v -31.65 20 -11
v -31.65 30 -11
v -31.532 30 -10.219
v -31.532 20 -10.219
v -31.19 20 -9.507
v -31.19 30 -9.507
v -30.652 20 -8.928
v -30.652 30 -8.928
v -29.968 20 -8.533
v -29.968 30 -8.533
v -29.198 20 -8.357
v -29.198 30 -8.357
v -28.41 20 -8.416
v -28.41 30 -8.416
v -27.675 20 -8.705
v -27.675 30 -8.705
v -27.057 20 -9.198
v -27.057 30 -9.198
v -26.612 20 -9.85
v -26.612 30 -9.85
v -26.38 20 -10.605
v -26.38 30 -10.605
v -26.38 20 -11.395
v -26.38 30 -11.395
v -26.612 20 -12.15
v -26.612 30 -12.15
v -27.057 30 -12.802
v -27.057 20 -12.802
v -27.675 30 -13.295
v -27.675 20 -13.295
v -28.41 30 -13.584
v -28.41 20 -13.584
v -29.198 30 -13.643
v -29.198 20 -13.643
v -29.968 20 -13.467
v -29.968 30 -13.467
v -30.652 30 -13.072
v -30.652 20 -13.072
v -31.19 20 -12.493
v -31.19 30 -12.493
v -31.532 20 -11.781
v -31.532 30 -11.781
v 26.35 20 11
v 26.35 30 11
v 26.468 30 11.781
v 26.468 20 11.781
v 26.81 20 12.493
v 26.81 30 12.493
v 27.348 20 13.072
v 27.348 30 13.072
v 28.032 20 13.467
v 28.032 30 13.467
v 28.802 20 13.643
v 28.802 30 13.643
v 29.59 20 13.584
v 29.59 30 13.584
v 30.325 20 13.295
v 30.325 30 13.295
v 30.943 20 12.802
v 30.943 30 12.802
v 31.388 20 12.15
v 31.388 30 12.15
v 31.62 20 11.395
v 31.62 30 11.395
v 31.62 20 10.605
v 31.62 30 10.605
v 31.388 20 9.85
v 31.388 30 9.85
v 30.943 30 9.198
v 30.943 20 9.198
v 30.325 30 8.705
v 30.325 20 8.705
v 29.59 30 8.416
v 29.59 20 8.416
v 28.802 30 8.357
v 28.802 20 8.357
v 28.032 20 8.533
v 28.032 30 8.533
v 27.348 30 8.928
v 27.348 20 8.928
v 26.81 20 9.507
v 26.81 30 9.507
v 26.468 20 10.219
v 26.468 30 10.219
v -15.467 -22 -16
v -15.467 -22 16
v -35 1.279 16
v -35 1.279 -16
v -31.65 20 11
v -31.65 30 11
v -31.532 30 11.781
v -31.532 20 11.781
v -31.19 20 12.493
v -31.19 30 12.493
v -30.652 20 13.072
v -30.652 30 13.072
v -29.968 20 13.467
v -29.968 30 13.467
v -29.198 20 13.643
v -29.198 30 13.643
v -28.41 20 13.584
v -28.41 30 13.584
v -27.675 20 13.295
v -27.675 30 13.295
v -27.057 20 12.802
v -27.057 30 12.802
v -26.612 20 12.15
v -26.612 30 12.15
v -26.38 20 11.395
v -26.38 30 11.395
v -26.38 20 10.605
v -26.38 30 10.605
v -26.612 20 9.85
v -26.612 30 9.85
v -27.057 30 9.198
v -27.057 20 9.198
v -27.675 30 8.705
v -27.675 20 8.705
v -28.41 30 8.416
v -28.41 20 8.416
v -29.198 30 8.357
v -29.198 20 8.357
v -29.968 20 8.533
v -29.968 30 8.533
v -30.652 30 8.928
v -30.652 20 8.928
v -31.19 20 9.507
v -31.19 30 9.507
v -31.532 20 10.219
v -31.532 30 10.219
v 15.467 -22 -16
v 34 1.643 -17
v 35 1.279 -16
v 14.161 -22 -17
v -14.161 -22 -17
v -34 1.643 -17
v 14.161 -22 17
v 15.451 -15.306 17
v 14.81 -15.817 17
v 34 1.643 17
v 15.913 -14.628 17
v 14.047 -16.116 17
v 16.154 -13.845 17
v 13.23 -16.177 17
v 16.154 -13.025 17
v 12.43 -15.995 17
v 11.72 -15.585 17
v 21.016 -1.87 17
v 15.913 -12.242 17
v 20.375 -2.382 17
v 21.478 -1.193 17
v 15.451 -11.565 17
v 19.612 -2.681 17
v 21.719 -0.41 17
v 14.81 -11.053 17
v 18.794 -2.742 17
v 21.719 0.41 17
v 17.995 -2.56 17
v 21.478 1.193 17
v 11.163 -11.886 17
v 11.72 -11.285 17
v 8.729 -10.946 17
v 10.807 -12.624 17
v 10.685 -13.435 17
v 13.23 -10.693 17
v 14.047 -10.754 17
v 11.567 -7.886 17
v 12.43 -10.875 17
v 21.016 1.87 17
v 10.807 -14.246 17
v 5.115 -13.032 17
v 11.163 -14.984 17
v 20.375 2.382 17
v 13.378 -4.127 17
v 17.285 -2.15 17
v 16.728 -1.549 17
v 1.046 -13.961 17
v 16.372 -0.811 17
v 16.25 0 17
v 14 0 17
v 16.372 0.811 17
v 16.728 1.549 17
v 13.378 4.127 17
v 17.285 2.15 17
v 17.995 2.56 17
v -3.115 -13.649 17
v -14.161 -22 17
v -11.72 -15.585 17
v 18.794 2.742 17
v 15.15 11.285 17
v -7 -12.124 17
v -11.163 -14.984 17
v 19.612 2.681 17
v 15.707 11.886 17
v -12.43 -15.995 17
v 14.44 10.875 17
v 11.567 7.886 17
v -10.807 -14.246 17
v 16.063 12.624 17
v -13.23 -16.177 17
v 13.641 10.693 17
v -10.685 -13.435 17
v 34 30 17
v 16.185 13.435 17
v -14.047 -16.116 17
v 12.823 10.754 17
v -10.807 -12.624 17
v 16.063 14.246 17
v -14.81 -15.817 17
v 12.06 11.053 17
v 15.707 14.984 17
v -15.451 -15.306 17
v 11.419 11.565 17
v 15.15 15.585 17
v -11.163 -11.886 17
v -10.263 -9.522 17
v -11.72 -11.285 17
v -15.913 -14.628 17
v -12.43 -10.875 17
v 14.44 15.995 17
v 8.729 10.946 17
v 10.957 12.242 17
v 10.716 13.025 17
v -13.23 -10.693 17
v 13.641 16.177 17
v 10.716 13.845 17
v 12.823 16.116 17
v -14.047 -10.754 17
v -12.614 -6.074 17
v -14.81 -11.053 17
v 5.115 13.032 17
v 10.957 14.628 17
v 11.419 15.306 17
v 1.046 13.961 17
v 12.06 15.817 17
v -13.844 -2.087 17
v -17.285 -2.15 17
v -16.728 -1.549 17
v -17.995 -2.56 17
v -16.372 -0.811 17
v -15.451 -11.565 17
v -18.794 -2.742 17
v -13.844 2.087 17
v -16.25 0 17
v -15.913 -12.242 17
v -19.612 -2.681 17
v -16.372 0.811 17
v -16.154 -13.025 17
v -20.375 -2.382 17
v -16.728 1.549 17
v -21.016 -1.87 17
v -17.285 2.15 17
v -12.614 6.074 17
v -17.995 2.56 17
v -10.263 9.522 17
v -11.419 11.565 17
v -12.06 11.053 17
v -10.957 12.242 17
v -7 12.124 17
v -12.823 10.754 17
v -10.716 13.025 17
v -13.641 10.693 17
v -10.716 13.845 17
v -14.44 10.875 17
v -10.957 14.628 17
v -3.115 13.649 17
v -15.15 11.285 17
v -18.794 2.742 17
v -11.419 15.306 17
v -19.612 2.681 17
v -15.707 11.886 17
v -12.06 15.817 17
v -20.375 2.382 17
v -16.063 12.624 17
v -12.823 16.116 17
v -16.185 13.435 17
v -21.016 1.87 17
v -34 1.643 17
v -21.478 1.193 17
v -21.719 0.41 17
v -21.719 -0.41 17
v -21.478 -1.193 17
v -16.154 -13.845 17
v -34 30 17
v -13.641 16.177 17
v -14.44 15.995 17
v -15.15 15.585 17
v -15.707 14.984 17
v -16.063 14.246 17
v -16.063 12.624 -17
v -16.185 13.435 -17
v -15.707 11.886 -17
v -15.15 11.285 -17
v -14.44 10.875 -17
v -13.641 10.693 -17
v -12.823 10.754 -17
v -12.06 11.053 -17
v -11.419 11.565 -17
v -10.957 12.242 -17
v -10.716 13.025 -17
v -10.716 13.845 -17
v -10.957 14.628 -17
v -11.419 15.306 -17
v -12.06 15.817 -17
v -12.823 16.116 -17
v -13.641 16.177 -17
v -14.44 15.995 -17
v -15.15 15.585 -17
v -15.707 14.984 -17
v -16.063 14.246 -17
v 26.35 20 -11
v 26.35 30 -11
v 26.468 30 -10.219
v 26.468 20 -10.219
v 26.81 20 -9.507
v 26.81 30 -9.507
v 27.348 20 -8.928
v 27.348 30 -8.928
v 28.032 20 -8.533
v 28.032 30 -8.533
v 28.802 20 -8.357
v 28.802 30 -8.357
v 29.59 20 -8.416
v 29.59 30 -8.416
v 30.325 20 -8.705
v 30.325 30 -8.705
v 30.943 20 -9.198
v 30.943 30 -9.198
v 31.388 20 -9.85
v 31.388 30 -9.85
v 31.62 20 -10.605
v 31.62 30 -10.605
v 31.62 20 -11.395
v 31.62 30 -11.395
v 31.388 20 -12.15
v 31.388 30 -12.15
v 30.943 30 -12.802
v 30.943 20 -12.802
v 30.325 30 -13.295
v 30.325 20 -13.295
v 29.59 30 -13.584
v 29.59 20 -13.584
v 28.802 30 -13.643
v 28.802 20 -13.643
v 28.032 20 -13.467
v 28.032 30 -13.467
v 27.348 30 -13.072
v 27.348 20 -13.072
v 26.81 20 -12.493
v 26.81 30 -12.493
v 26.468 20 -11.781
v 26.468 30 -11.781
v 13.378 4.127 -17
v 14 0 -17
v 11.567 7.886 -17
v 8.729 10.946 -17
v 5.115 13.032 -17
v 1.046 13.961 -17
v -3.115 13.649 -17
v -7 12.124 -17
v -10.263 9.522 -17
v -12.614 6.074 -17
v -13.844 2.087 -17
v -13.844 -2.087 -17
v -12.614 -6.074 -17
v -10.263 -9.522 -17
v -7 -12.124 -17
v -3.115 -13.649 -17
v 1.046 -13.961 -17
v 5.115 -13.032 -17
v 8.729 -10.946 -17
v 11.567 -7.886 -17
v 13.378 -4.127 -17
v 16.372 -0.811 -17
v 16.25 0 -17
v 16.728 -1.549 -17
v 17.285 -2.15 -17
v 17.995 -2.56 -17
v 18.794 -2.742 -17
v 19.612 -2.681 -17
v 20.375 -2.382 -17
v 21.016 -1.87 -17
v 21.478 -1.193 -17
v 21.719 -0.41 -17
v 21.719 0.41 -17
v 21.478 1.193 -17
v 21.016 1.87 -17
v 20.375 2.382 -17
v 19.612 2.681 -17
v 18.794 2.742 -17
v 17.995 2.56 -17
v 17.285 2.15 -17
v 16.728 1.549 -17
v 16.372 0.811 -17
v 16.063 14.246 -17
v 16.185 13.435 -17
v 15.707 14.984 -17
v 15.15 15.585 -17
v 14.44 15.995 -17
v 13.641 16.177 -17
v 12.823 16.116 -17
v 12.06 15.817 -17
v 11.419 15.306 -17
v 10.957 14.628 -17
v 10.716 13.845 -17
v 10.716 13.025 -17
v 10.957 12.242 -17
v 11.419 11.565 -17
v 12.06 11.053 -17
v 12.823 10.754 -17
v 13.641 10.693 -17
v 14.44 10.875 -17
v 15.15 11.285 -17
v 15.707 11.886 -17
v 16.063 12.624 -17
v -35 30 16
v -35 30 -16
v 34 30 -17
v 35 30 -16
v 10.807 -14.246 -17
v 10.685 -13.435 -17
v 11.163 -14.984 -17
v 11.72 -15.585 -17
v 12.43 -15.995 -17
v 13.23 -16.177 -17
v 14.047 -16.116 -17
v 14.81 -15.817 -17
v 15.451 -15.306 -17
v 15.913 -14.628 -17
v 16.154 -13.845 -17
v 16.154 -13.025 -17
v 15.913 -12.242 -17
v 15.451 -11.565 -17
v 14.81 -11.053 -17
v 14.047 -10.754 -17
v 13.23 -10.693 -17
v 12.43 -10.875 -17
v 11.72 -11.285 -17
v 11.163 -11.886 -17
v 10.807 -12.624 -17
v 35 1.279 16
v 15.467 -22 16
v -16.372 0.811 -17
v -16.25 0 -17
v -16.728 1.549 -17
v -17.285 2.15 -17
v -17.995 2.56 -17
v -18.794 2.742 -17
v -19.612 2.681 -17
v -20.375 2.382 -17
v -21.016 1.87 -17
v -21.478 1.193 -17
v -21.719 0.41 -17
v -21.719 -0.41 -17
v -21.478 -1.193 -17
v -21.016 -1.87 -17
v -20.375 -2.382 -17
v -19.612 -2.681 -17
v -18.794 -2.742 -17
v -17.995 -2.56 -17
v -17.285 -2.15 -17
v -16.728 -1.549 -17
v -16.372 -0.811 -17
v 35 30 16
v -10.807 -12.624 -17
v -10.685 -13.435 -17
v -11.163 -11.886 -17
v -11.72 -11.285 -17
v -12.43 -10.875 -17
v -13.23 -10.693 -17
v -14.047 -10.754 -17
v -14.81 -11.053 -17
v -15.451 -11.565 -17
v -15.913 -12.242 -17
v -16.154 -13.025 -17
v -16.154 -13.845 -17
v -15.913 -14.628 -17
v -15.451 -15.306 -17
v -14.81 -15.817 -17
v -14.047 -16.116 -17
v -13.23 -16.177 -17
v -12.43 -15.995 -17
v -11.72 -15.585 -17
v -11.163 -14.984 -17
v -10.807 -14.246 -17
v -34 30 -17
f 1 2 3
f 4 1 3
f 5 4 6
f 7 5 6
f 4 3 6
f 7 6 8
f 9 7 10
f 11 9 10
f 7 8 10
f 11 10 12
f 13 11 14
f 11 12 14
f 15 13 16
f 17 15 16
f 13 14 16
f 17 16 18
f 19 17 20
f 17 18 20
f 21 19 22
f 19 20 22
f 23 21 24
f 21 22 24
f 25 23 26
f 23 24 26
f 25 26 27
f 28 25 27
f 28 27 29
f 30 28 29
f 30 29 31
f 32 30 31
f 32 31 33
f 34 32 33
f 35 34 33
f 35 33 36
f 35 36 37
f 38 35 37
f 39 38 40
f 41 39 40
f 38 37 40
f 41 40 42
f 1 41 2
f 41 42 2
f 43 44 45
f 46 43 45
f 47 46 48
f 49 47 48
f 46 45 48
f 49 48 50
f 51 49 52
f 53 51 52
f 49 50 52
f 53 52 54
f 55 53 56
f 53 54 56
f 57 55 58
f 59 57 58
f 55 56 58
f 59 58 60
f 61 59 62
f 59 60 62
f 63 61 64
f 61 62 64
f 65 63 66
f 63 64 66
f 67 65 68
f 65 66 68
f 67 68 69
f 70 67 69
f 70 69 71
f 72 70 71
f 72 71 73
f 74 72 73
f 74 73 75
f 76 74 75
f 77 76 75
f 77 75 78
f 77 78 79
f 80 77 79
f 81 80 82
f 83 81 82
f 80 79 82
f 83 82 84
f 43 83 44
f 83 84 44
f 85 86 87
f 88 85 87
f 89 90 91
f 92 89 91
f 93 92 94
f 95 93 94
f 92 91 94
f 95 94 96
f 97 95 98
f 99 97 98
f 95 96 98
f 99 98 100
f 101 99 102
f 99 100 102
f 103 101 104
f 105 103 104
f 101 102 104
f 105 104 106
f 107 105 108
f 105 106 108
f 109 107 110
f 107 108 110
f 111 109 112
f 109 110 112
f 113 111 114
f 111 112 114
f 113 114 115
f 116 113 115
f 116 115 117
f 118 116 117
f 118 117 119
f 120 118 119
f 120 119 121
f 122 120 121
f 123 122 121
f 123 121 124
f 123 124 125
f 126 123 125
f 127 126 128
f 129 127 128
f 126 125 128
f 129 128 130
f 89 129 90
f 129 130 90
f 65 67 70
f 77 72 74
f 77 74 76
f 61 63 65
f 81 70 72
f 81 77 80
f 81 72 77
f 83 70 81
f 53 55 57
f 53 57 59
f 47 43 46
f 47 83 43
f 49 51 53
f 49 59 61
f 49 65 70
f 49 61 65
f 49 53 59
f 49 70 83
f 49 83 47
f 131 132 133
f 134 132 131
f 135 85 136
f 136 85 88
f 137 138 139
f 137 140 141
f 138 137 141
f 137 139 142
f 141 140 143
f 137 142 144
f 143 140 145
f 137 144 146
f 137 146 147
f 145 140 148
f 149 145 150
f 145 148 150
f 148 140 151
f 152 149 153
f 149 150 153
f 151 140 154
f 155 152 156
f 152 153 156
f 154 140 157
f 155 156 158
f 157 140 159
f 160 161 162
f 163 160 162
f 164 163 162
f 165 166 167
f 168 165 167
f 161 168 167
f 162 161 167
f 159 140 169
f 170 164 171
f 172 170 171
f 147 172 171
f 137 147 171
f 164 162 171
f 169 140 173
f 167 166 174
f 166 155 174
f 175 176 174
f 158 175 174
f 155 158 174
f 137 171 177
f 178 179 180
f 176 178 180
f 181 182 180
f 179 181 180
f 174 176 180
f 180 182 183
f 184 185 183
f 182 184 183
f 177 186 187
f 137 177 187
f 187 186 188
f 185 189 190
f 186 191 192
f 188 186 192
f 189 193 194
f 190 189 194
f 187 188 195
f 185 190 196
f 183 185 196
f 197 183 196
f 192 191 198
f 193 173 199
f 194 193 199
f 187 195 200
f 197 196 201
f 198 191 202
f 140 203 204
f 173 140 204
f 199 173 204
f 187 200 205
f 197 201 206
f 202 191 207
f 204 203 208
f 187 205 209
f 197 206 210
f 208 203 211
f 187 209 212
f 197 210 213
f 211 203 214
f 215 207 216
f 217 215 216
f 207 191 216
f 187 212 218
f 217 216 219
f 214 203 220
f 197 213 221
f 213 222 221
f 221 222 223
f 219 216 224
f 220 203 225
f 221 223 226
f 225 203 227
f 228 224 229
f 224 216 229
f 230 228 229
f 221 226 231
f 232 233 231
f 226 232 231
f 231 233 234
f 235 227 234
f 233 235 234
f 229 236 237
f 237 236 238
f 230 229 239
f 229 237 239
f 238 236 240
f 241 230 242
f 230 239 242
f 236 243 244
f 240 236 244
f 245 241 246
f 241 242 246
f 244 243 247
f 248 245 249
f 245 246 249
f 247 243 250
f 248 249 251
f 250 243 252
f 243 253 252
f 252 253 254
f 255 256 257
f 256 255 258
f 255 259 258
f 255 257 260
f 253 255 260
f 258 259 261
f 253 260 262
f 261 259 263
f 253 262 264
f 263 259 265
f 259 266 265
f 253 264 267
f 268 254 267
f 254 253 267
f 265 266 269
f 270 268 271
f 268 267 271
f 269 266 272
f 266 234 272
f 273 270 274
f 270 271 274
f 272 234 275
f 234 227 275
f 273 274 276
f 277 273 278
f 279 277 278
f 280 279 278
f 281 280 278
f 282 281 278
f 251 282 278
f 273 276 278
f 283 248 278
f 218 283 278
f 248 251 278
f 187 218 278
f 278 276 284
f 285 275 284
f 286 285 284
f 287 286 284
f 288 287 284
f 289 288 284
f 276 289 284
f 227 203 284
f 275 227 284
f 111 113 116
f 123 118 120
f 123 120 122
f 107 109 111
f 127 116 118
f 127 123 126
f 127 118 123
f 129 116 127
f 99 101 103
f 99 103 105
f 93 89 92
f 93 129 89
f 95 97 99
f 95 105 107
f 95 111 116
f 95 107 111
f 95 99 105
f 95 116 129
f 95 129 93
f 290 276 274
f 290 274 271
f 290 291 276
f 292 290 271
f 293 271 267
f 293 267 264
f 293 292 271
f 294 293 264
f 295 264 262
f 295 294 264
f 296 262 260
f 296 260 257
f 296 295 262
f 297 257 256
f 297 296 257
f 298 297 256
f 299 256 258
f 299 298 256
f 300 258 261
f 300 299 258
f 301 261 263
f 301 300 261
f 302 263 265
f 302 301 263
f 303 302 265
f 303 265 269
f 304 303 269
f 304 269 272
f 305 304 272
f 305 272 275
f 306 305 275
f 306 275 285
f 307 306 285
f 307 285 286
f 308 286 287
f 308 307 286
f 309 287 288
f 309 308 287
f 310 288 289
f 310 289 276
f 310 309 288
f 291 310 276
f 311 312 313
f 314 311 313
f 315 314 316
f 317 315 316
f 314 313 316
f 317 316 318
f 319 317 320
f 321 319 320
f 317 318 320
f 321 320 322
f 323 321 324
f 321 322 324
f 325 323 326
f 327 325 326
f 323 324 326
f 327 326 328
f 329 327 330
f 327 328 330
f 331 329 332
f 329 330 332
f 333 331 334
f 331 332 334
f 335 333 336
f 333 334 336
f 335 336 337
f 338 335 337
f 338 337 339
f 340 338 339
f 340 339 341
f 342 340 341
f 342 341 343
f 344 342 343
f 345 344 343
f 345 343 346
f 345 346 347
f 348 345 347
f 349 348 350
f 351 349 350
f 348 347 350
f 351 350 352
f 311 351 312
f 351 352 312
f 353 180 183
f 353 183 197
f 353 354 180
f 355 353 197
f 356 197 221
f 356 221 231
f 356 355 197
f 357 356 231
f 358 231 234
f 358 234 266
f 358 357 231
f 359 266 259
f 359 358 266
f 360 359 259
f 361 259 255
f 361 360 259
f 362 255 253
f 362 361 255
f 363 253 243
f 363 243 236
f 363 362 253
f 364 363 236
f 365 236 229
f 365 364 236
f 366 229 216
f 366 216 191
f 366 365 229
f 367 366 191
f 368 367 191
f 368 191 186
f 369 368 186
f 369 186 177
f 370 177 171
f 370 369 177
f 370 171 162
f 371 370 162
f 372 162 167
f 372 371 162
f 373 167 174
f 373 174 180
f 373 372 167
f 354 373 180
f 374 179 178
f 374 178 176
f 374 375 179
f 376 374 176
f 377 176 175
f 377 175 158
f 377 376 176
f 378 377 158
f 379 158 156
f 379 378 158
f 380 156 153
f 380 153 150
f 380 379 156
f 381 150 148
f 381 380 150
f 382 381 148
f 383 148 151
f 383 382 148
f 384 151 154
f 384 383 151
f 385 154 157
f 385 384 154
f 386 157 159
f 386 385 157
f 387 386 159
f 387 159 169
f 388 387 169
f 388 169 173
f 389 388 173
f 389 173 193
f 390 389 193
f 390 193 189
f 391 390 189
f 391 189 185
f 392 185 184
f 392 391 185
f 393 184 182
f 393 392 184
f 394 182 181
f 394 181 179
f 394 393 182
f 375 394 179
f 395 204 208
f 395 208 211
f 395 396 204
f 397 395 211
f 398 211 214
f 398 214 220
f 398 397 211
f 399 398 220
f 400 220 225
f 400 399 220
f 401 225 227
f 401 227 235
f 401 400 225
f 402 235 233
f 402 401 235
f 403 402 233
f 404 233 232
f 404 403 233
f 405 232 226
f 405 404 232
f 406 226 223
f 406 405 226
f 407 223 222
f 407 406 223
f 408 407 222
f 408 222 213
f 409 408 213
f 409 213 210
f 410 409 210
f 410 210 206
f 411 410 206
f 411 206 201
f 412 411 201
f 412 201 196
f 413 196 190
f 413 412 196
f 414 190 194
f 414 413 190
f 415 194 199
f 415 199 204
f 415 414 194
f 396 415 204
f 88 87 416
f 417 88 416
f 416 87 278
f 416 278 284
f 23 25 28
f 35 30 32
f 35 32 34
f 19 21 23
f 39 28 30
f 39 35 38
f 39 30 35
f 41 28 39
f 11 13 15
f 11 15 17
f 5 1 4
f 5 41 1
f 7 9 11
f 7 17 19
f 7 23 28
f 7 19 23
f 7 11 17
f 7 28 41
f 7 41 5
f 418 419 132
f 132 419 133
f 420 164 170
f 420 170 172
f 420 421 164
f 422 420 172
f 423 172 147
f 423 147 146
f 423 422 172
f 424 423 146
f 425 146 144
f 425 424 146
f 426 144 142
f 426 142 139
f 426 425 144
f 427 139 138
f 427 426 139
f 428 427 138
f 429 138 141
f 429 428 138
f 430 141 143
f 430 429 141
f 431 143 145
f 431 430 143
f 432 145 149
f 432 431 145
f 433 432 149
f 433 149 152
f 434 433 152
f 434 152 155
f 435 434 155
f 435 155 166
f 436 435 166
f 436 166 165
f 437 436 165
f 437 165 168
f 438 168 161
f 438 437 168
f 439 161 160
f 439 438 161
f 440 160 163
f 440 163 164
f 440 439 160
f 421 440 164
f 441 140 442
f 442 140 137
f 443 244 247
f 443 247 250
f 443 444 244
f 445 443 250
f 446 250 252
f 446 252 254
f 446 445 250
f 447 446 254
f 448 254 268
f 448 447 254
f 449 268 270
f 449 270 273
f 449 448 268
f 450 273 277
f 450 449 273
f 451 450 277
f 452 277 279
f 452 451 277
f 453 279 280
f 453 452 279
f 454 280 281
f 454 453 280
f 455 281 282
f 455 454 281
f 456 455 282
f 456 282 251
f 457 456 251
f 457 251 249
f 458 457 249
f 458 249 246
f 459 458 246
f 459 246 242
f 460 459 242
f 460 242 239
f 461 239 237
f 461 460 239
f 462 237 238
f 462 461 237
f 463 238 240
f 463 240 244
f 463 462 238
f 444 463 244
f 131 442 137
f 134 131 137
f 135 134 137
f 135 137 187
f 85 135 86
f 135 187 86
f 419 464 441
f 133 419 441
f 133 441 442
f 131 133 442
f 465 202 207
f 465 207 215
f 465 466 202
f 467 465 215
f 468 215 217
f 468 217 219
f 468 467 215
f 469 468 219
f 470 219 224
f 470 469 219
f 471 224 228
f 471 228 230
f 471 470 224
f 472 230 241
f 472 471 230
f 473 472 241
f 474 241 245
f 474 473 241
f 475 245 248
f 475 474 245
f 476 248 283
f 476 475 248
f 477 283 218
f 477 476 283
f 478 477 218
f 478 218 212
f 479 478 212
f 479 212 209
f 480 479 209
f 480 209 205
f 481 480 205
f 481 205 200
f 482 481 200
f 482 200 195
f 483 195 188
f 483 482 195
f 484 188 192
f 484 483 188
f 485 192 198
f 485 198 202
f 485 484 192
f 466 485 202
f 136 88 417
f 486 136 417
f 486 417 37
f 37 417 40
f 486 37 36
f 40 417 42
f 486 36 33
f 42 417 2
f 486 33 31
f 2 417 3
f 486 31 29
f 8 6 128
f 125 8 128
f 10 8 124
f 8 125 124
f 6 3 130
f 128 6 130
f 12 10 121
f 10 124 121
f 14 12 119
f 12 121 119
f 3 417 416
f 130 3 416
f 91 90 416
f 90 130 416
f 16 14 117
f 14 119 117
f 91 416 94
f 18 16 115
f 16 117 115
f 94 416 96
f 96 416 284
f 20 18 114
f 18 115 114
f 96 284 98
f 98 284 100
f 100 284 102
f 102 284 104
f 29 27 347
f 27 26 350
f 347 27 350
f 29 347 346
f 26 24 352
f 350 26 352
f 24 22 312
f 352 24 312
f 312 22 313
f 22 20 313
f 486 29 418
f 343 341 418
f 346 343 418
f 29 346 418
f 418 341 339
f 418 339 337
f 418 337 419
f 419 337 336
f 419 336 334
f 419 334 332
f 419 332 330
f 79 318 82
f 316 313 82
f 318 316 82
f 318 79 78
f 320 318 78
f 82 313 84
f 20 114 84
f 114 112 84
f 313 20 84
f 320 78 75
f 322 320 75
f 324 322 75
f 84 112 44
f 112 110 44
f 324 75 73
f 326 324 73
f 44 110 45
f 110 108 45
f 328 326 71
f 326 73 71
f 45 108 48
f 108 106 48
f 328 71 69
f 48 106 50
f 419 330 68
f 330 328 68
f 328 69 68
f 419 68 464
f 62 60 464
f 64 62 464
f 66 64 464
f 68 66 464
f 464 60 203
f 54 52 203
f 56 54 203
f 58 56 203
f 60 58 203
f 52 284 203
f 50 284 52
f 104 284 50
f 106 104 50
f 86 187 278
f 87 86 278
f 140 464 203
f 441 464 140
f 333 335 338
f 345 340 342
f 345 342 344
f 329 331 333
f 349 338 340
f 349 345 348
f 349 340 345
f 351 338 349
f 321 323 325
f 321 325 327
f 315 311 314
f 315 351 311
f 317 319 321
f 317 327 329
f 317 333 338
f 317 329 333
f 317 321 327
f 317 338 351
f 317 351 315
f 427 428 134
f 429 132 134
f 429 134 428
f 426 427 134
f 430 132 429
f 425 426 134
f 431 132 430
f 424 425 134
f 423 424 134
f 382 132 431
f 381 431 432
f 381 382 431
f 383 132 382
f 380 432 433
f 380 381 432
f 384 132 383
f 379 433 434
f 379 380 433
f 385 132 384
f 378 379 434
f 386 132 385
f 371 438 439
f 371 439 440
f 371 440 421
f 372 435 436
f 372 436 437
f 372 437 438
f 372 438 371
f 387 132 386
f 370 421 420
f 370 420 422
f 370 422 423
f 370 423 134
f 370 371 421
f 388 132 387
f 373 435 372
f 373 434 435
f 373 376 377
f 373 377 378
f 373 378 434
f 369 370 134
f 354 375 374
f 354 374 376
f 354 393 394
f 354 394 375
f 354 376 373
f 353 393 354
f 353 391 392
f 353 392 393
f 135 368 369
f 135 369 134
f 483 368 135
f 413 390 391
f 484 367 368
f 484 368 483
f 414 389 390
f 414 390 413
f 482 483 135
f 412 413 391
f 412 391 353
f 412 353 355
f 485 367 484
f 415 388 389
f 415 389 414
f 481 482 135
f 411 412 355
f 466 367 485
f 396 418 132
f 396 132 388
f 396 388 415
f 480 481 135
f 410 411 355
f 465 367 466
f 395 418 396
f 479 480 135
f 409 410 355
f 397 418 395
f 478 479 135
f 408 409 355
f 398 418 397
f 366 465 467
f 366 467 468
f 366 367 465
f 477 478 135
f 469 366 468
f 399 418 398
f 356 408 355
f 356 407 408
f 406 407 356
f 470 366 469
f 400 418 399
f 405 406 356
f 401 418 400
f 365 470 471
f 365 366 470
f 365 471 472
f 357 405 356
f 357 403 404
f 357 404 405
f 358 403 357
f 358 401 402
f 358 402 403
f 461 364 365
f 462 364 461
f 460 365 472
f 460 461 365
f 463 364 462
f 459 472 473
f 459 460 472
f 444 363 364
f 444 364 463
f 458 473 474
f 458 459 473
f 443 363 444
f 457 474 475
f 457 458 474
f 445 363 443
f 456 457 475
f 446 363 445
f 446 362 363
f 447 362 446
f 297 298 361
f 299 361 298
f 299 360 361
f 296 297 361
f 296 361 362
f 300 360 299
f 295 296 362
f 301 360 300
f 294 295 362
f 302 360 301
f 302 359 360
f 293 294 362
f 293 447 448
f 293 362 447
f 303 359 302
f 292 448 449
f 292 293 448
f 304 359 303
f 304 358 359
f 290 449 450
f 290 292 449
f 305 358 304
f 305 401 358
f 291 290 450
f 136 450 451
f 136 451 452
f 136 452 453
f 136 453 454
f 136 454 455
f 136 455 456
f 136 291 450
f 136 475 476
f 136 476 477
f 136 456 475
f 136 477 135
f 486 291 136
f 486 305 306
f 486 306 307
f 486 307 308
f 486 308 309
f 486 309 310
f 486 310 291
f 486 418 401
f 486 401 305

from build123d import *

# Parameters (mm, degrees)
SKETCH1_R           = 14
SKETCH1_R_2         = 2.75
BOSS_EXTRUDE1_DEPTH = 17
SKETCH2_R           = 2.65
CUT_EXTRUDE1_DEPTH  = 10
CHAMFER1_SIZE       = 1


with BuildPart() as part:
    # Sketch1 → Boss-Extrude1 (new, symmetric)
    with BuildSketch(Plane.XY):
        Polygon((15.46675804, -22), (-15.46675804, -22), (-35, 1.278811281), (-35, 30), (35, 30), (35, 1.278811281), align=None)
        Circle(SKETCH1_R, mode=Mode.SUBTRACT)
        with Locations((-13.435028843, -13.435028843)):
            Circle(SKETCH1_R_2, mode=Mode.SUBTRACT)
        with Locations((-19, 0)):
            Circle(SKETCH1_R_2, mode=Mode.SUBTRACT)
        with Locations(Location((-13.435028843, 13.435028843, 0), (0, 0, 180))):
            Circle(SKETCH1_R_2, mode=Mode.SUBTRACT)
        with Locations((13.435028843, 13.435028843)):
            Circle(SKETCH1_R_2, mode=Mode.SUBTRACT)
        with Locations(Location((19, 0, 0), (0, 0, 180))):
            Circle(SKETCH1_R_2, mode=Mode.SUBTRACT)
        with Locations(Location((13.435028843, -13.435028843, 0), (0, 0, 180))):
            Circle(SKETCH1_R_2, mode=Mode.SUBTRACT)
    extrude(amount=BOSS_EXTRUDE1_DEPTH, both=True)

    # Sketch2 → Cut-Extrude1 (cut)
    with BuildSketch(Plane(origin=(0, 30, 0), x_dir=(1, 0, 0), z_dir=(0, 1, 0))):
        with Locations(Location((-29, 11, 0), (0, 0, 180))):
            Circle(SKETCH2_R)
        with Locations(Location((-29, -11, 0), (0, 0, 180))):
            Circle(SKETCH2_R)
        with Locations(Location((29, -11, 0), (0, 0, 180))):
            Circle(SKETCH2_R)
        with Locations(Location((29, 11, 0), (0, 0, 180))):
            Circle(SKETCH2_R)
    extrude(amount=-CUT_EXTRUDE1_DEPTH, mode=Mode.SUBTRACT)

    # Chamfer1
    chamfer1_edges = [part.edges().sort_by_distance(p)[0] for p in [
        (-35, 15.639405641, 17),
        (-25.23337902, -10.360594359, 17),
        (25.23337902, -10.360594359, 17),
        (35, 15.639405641, 17),
        (25.23337902, -10.360594359, -17),
        (-25.23337902, -10.360594359, -17),
        (-35, 15.639405641, -17),
        (35, 15.639405641, -17),
    ]]
    chamfer(chamfer1_edges, length=CHAMFER1_SIZE)


solid = part.part
